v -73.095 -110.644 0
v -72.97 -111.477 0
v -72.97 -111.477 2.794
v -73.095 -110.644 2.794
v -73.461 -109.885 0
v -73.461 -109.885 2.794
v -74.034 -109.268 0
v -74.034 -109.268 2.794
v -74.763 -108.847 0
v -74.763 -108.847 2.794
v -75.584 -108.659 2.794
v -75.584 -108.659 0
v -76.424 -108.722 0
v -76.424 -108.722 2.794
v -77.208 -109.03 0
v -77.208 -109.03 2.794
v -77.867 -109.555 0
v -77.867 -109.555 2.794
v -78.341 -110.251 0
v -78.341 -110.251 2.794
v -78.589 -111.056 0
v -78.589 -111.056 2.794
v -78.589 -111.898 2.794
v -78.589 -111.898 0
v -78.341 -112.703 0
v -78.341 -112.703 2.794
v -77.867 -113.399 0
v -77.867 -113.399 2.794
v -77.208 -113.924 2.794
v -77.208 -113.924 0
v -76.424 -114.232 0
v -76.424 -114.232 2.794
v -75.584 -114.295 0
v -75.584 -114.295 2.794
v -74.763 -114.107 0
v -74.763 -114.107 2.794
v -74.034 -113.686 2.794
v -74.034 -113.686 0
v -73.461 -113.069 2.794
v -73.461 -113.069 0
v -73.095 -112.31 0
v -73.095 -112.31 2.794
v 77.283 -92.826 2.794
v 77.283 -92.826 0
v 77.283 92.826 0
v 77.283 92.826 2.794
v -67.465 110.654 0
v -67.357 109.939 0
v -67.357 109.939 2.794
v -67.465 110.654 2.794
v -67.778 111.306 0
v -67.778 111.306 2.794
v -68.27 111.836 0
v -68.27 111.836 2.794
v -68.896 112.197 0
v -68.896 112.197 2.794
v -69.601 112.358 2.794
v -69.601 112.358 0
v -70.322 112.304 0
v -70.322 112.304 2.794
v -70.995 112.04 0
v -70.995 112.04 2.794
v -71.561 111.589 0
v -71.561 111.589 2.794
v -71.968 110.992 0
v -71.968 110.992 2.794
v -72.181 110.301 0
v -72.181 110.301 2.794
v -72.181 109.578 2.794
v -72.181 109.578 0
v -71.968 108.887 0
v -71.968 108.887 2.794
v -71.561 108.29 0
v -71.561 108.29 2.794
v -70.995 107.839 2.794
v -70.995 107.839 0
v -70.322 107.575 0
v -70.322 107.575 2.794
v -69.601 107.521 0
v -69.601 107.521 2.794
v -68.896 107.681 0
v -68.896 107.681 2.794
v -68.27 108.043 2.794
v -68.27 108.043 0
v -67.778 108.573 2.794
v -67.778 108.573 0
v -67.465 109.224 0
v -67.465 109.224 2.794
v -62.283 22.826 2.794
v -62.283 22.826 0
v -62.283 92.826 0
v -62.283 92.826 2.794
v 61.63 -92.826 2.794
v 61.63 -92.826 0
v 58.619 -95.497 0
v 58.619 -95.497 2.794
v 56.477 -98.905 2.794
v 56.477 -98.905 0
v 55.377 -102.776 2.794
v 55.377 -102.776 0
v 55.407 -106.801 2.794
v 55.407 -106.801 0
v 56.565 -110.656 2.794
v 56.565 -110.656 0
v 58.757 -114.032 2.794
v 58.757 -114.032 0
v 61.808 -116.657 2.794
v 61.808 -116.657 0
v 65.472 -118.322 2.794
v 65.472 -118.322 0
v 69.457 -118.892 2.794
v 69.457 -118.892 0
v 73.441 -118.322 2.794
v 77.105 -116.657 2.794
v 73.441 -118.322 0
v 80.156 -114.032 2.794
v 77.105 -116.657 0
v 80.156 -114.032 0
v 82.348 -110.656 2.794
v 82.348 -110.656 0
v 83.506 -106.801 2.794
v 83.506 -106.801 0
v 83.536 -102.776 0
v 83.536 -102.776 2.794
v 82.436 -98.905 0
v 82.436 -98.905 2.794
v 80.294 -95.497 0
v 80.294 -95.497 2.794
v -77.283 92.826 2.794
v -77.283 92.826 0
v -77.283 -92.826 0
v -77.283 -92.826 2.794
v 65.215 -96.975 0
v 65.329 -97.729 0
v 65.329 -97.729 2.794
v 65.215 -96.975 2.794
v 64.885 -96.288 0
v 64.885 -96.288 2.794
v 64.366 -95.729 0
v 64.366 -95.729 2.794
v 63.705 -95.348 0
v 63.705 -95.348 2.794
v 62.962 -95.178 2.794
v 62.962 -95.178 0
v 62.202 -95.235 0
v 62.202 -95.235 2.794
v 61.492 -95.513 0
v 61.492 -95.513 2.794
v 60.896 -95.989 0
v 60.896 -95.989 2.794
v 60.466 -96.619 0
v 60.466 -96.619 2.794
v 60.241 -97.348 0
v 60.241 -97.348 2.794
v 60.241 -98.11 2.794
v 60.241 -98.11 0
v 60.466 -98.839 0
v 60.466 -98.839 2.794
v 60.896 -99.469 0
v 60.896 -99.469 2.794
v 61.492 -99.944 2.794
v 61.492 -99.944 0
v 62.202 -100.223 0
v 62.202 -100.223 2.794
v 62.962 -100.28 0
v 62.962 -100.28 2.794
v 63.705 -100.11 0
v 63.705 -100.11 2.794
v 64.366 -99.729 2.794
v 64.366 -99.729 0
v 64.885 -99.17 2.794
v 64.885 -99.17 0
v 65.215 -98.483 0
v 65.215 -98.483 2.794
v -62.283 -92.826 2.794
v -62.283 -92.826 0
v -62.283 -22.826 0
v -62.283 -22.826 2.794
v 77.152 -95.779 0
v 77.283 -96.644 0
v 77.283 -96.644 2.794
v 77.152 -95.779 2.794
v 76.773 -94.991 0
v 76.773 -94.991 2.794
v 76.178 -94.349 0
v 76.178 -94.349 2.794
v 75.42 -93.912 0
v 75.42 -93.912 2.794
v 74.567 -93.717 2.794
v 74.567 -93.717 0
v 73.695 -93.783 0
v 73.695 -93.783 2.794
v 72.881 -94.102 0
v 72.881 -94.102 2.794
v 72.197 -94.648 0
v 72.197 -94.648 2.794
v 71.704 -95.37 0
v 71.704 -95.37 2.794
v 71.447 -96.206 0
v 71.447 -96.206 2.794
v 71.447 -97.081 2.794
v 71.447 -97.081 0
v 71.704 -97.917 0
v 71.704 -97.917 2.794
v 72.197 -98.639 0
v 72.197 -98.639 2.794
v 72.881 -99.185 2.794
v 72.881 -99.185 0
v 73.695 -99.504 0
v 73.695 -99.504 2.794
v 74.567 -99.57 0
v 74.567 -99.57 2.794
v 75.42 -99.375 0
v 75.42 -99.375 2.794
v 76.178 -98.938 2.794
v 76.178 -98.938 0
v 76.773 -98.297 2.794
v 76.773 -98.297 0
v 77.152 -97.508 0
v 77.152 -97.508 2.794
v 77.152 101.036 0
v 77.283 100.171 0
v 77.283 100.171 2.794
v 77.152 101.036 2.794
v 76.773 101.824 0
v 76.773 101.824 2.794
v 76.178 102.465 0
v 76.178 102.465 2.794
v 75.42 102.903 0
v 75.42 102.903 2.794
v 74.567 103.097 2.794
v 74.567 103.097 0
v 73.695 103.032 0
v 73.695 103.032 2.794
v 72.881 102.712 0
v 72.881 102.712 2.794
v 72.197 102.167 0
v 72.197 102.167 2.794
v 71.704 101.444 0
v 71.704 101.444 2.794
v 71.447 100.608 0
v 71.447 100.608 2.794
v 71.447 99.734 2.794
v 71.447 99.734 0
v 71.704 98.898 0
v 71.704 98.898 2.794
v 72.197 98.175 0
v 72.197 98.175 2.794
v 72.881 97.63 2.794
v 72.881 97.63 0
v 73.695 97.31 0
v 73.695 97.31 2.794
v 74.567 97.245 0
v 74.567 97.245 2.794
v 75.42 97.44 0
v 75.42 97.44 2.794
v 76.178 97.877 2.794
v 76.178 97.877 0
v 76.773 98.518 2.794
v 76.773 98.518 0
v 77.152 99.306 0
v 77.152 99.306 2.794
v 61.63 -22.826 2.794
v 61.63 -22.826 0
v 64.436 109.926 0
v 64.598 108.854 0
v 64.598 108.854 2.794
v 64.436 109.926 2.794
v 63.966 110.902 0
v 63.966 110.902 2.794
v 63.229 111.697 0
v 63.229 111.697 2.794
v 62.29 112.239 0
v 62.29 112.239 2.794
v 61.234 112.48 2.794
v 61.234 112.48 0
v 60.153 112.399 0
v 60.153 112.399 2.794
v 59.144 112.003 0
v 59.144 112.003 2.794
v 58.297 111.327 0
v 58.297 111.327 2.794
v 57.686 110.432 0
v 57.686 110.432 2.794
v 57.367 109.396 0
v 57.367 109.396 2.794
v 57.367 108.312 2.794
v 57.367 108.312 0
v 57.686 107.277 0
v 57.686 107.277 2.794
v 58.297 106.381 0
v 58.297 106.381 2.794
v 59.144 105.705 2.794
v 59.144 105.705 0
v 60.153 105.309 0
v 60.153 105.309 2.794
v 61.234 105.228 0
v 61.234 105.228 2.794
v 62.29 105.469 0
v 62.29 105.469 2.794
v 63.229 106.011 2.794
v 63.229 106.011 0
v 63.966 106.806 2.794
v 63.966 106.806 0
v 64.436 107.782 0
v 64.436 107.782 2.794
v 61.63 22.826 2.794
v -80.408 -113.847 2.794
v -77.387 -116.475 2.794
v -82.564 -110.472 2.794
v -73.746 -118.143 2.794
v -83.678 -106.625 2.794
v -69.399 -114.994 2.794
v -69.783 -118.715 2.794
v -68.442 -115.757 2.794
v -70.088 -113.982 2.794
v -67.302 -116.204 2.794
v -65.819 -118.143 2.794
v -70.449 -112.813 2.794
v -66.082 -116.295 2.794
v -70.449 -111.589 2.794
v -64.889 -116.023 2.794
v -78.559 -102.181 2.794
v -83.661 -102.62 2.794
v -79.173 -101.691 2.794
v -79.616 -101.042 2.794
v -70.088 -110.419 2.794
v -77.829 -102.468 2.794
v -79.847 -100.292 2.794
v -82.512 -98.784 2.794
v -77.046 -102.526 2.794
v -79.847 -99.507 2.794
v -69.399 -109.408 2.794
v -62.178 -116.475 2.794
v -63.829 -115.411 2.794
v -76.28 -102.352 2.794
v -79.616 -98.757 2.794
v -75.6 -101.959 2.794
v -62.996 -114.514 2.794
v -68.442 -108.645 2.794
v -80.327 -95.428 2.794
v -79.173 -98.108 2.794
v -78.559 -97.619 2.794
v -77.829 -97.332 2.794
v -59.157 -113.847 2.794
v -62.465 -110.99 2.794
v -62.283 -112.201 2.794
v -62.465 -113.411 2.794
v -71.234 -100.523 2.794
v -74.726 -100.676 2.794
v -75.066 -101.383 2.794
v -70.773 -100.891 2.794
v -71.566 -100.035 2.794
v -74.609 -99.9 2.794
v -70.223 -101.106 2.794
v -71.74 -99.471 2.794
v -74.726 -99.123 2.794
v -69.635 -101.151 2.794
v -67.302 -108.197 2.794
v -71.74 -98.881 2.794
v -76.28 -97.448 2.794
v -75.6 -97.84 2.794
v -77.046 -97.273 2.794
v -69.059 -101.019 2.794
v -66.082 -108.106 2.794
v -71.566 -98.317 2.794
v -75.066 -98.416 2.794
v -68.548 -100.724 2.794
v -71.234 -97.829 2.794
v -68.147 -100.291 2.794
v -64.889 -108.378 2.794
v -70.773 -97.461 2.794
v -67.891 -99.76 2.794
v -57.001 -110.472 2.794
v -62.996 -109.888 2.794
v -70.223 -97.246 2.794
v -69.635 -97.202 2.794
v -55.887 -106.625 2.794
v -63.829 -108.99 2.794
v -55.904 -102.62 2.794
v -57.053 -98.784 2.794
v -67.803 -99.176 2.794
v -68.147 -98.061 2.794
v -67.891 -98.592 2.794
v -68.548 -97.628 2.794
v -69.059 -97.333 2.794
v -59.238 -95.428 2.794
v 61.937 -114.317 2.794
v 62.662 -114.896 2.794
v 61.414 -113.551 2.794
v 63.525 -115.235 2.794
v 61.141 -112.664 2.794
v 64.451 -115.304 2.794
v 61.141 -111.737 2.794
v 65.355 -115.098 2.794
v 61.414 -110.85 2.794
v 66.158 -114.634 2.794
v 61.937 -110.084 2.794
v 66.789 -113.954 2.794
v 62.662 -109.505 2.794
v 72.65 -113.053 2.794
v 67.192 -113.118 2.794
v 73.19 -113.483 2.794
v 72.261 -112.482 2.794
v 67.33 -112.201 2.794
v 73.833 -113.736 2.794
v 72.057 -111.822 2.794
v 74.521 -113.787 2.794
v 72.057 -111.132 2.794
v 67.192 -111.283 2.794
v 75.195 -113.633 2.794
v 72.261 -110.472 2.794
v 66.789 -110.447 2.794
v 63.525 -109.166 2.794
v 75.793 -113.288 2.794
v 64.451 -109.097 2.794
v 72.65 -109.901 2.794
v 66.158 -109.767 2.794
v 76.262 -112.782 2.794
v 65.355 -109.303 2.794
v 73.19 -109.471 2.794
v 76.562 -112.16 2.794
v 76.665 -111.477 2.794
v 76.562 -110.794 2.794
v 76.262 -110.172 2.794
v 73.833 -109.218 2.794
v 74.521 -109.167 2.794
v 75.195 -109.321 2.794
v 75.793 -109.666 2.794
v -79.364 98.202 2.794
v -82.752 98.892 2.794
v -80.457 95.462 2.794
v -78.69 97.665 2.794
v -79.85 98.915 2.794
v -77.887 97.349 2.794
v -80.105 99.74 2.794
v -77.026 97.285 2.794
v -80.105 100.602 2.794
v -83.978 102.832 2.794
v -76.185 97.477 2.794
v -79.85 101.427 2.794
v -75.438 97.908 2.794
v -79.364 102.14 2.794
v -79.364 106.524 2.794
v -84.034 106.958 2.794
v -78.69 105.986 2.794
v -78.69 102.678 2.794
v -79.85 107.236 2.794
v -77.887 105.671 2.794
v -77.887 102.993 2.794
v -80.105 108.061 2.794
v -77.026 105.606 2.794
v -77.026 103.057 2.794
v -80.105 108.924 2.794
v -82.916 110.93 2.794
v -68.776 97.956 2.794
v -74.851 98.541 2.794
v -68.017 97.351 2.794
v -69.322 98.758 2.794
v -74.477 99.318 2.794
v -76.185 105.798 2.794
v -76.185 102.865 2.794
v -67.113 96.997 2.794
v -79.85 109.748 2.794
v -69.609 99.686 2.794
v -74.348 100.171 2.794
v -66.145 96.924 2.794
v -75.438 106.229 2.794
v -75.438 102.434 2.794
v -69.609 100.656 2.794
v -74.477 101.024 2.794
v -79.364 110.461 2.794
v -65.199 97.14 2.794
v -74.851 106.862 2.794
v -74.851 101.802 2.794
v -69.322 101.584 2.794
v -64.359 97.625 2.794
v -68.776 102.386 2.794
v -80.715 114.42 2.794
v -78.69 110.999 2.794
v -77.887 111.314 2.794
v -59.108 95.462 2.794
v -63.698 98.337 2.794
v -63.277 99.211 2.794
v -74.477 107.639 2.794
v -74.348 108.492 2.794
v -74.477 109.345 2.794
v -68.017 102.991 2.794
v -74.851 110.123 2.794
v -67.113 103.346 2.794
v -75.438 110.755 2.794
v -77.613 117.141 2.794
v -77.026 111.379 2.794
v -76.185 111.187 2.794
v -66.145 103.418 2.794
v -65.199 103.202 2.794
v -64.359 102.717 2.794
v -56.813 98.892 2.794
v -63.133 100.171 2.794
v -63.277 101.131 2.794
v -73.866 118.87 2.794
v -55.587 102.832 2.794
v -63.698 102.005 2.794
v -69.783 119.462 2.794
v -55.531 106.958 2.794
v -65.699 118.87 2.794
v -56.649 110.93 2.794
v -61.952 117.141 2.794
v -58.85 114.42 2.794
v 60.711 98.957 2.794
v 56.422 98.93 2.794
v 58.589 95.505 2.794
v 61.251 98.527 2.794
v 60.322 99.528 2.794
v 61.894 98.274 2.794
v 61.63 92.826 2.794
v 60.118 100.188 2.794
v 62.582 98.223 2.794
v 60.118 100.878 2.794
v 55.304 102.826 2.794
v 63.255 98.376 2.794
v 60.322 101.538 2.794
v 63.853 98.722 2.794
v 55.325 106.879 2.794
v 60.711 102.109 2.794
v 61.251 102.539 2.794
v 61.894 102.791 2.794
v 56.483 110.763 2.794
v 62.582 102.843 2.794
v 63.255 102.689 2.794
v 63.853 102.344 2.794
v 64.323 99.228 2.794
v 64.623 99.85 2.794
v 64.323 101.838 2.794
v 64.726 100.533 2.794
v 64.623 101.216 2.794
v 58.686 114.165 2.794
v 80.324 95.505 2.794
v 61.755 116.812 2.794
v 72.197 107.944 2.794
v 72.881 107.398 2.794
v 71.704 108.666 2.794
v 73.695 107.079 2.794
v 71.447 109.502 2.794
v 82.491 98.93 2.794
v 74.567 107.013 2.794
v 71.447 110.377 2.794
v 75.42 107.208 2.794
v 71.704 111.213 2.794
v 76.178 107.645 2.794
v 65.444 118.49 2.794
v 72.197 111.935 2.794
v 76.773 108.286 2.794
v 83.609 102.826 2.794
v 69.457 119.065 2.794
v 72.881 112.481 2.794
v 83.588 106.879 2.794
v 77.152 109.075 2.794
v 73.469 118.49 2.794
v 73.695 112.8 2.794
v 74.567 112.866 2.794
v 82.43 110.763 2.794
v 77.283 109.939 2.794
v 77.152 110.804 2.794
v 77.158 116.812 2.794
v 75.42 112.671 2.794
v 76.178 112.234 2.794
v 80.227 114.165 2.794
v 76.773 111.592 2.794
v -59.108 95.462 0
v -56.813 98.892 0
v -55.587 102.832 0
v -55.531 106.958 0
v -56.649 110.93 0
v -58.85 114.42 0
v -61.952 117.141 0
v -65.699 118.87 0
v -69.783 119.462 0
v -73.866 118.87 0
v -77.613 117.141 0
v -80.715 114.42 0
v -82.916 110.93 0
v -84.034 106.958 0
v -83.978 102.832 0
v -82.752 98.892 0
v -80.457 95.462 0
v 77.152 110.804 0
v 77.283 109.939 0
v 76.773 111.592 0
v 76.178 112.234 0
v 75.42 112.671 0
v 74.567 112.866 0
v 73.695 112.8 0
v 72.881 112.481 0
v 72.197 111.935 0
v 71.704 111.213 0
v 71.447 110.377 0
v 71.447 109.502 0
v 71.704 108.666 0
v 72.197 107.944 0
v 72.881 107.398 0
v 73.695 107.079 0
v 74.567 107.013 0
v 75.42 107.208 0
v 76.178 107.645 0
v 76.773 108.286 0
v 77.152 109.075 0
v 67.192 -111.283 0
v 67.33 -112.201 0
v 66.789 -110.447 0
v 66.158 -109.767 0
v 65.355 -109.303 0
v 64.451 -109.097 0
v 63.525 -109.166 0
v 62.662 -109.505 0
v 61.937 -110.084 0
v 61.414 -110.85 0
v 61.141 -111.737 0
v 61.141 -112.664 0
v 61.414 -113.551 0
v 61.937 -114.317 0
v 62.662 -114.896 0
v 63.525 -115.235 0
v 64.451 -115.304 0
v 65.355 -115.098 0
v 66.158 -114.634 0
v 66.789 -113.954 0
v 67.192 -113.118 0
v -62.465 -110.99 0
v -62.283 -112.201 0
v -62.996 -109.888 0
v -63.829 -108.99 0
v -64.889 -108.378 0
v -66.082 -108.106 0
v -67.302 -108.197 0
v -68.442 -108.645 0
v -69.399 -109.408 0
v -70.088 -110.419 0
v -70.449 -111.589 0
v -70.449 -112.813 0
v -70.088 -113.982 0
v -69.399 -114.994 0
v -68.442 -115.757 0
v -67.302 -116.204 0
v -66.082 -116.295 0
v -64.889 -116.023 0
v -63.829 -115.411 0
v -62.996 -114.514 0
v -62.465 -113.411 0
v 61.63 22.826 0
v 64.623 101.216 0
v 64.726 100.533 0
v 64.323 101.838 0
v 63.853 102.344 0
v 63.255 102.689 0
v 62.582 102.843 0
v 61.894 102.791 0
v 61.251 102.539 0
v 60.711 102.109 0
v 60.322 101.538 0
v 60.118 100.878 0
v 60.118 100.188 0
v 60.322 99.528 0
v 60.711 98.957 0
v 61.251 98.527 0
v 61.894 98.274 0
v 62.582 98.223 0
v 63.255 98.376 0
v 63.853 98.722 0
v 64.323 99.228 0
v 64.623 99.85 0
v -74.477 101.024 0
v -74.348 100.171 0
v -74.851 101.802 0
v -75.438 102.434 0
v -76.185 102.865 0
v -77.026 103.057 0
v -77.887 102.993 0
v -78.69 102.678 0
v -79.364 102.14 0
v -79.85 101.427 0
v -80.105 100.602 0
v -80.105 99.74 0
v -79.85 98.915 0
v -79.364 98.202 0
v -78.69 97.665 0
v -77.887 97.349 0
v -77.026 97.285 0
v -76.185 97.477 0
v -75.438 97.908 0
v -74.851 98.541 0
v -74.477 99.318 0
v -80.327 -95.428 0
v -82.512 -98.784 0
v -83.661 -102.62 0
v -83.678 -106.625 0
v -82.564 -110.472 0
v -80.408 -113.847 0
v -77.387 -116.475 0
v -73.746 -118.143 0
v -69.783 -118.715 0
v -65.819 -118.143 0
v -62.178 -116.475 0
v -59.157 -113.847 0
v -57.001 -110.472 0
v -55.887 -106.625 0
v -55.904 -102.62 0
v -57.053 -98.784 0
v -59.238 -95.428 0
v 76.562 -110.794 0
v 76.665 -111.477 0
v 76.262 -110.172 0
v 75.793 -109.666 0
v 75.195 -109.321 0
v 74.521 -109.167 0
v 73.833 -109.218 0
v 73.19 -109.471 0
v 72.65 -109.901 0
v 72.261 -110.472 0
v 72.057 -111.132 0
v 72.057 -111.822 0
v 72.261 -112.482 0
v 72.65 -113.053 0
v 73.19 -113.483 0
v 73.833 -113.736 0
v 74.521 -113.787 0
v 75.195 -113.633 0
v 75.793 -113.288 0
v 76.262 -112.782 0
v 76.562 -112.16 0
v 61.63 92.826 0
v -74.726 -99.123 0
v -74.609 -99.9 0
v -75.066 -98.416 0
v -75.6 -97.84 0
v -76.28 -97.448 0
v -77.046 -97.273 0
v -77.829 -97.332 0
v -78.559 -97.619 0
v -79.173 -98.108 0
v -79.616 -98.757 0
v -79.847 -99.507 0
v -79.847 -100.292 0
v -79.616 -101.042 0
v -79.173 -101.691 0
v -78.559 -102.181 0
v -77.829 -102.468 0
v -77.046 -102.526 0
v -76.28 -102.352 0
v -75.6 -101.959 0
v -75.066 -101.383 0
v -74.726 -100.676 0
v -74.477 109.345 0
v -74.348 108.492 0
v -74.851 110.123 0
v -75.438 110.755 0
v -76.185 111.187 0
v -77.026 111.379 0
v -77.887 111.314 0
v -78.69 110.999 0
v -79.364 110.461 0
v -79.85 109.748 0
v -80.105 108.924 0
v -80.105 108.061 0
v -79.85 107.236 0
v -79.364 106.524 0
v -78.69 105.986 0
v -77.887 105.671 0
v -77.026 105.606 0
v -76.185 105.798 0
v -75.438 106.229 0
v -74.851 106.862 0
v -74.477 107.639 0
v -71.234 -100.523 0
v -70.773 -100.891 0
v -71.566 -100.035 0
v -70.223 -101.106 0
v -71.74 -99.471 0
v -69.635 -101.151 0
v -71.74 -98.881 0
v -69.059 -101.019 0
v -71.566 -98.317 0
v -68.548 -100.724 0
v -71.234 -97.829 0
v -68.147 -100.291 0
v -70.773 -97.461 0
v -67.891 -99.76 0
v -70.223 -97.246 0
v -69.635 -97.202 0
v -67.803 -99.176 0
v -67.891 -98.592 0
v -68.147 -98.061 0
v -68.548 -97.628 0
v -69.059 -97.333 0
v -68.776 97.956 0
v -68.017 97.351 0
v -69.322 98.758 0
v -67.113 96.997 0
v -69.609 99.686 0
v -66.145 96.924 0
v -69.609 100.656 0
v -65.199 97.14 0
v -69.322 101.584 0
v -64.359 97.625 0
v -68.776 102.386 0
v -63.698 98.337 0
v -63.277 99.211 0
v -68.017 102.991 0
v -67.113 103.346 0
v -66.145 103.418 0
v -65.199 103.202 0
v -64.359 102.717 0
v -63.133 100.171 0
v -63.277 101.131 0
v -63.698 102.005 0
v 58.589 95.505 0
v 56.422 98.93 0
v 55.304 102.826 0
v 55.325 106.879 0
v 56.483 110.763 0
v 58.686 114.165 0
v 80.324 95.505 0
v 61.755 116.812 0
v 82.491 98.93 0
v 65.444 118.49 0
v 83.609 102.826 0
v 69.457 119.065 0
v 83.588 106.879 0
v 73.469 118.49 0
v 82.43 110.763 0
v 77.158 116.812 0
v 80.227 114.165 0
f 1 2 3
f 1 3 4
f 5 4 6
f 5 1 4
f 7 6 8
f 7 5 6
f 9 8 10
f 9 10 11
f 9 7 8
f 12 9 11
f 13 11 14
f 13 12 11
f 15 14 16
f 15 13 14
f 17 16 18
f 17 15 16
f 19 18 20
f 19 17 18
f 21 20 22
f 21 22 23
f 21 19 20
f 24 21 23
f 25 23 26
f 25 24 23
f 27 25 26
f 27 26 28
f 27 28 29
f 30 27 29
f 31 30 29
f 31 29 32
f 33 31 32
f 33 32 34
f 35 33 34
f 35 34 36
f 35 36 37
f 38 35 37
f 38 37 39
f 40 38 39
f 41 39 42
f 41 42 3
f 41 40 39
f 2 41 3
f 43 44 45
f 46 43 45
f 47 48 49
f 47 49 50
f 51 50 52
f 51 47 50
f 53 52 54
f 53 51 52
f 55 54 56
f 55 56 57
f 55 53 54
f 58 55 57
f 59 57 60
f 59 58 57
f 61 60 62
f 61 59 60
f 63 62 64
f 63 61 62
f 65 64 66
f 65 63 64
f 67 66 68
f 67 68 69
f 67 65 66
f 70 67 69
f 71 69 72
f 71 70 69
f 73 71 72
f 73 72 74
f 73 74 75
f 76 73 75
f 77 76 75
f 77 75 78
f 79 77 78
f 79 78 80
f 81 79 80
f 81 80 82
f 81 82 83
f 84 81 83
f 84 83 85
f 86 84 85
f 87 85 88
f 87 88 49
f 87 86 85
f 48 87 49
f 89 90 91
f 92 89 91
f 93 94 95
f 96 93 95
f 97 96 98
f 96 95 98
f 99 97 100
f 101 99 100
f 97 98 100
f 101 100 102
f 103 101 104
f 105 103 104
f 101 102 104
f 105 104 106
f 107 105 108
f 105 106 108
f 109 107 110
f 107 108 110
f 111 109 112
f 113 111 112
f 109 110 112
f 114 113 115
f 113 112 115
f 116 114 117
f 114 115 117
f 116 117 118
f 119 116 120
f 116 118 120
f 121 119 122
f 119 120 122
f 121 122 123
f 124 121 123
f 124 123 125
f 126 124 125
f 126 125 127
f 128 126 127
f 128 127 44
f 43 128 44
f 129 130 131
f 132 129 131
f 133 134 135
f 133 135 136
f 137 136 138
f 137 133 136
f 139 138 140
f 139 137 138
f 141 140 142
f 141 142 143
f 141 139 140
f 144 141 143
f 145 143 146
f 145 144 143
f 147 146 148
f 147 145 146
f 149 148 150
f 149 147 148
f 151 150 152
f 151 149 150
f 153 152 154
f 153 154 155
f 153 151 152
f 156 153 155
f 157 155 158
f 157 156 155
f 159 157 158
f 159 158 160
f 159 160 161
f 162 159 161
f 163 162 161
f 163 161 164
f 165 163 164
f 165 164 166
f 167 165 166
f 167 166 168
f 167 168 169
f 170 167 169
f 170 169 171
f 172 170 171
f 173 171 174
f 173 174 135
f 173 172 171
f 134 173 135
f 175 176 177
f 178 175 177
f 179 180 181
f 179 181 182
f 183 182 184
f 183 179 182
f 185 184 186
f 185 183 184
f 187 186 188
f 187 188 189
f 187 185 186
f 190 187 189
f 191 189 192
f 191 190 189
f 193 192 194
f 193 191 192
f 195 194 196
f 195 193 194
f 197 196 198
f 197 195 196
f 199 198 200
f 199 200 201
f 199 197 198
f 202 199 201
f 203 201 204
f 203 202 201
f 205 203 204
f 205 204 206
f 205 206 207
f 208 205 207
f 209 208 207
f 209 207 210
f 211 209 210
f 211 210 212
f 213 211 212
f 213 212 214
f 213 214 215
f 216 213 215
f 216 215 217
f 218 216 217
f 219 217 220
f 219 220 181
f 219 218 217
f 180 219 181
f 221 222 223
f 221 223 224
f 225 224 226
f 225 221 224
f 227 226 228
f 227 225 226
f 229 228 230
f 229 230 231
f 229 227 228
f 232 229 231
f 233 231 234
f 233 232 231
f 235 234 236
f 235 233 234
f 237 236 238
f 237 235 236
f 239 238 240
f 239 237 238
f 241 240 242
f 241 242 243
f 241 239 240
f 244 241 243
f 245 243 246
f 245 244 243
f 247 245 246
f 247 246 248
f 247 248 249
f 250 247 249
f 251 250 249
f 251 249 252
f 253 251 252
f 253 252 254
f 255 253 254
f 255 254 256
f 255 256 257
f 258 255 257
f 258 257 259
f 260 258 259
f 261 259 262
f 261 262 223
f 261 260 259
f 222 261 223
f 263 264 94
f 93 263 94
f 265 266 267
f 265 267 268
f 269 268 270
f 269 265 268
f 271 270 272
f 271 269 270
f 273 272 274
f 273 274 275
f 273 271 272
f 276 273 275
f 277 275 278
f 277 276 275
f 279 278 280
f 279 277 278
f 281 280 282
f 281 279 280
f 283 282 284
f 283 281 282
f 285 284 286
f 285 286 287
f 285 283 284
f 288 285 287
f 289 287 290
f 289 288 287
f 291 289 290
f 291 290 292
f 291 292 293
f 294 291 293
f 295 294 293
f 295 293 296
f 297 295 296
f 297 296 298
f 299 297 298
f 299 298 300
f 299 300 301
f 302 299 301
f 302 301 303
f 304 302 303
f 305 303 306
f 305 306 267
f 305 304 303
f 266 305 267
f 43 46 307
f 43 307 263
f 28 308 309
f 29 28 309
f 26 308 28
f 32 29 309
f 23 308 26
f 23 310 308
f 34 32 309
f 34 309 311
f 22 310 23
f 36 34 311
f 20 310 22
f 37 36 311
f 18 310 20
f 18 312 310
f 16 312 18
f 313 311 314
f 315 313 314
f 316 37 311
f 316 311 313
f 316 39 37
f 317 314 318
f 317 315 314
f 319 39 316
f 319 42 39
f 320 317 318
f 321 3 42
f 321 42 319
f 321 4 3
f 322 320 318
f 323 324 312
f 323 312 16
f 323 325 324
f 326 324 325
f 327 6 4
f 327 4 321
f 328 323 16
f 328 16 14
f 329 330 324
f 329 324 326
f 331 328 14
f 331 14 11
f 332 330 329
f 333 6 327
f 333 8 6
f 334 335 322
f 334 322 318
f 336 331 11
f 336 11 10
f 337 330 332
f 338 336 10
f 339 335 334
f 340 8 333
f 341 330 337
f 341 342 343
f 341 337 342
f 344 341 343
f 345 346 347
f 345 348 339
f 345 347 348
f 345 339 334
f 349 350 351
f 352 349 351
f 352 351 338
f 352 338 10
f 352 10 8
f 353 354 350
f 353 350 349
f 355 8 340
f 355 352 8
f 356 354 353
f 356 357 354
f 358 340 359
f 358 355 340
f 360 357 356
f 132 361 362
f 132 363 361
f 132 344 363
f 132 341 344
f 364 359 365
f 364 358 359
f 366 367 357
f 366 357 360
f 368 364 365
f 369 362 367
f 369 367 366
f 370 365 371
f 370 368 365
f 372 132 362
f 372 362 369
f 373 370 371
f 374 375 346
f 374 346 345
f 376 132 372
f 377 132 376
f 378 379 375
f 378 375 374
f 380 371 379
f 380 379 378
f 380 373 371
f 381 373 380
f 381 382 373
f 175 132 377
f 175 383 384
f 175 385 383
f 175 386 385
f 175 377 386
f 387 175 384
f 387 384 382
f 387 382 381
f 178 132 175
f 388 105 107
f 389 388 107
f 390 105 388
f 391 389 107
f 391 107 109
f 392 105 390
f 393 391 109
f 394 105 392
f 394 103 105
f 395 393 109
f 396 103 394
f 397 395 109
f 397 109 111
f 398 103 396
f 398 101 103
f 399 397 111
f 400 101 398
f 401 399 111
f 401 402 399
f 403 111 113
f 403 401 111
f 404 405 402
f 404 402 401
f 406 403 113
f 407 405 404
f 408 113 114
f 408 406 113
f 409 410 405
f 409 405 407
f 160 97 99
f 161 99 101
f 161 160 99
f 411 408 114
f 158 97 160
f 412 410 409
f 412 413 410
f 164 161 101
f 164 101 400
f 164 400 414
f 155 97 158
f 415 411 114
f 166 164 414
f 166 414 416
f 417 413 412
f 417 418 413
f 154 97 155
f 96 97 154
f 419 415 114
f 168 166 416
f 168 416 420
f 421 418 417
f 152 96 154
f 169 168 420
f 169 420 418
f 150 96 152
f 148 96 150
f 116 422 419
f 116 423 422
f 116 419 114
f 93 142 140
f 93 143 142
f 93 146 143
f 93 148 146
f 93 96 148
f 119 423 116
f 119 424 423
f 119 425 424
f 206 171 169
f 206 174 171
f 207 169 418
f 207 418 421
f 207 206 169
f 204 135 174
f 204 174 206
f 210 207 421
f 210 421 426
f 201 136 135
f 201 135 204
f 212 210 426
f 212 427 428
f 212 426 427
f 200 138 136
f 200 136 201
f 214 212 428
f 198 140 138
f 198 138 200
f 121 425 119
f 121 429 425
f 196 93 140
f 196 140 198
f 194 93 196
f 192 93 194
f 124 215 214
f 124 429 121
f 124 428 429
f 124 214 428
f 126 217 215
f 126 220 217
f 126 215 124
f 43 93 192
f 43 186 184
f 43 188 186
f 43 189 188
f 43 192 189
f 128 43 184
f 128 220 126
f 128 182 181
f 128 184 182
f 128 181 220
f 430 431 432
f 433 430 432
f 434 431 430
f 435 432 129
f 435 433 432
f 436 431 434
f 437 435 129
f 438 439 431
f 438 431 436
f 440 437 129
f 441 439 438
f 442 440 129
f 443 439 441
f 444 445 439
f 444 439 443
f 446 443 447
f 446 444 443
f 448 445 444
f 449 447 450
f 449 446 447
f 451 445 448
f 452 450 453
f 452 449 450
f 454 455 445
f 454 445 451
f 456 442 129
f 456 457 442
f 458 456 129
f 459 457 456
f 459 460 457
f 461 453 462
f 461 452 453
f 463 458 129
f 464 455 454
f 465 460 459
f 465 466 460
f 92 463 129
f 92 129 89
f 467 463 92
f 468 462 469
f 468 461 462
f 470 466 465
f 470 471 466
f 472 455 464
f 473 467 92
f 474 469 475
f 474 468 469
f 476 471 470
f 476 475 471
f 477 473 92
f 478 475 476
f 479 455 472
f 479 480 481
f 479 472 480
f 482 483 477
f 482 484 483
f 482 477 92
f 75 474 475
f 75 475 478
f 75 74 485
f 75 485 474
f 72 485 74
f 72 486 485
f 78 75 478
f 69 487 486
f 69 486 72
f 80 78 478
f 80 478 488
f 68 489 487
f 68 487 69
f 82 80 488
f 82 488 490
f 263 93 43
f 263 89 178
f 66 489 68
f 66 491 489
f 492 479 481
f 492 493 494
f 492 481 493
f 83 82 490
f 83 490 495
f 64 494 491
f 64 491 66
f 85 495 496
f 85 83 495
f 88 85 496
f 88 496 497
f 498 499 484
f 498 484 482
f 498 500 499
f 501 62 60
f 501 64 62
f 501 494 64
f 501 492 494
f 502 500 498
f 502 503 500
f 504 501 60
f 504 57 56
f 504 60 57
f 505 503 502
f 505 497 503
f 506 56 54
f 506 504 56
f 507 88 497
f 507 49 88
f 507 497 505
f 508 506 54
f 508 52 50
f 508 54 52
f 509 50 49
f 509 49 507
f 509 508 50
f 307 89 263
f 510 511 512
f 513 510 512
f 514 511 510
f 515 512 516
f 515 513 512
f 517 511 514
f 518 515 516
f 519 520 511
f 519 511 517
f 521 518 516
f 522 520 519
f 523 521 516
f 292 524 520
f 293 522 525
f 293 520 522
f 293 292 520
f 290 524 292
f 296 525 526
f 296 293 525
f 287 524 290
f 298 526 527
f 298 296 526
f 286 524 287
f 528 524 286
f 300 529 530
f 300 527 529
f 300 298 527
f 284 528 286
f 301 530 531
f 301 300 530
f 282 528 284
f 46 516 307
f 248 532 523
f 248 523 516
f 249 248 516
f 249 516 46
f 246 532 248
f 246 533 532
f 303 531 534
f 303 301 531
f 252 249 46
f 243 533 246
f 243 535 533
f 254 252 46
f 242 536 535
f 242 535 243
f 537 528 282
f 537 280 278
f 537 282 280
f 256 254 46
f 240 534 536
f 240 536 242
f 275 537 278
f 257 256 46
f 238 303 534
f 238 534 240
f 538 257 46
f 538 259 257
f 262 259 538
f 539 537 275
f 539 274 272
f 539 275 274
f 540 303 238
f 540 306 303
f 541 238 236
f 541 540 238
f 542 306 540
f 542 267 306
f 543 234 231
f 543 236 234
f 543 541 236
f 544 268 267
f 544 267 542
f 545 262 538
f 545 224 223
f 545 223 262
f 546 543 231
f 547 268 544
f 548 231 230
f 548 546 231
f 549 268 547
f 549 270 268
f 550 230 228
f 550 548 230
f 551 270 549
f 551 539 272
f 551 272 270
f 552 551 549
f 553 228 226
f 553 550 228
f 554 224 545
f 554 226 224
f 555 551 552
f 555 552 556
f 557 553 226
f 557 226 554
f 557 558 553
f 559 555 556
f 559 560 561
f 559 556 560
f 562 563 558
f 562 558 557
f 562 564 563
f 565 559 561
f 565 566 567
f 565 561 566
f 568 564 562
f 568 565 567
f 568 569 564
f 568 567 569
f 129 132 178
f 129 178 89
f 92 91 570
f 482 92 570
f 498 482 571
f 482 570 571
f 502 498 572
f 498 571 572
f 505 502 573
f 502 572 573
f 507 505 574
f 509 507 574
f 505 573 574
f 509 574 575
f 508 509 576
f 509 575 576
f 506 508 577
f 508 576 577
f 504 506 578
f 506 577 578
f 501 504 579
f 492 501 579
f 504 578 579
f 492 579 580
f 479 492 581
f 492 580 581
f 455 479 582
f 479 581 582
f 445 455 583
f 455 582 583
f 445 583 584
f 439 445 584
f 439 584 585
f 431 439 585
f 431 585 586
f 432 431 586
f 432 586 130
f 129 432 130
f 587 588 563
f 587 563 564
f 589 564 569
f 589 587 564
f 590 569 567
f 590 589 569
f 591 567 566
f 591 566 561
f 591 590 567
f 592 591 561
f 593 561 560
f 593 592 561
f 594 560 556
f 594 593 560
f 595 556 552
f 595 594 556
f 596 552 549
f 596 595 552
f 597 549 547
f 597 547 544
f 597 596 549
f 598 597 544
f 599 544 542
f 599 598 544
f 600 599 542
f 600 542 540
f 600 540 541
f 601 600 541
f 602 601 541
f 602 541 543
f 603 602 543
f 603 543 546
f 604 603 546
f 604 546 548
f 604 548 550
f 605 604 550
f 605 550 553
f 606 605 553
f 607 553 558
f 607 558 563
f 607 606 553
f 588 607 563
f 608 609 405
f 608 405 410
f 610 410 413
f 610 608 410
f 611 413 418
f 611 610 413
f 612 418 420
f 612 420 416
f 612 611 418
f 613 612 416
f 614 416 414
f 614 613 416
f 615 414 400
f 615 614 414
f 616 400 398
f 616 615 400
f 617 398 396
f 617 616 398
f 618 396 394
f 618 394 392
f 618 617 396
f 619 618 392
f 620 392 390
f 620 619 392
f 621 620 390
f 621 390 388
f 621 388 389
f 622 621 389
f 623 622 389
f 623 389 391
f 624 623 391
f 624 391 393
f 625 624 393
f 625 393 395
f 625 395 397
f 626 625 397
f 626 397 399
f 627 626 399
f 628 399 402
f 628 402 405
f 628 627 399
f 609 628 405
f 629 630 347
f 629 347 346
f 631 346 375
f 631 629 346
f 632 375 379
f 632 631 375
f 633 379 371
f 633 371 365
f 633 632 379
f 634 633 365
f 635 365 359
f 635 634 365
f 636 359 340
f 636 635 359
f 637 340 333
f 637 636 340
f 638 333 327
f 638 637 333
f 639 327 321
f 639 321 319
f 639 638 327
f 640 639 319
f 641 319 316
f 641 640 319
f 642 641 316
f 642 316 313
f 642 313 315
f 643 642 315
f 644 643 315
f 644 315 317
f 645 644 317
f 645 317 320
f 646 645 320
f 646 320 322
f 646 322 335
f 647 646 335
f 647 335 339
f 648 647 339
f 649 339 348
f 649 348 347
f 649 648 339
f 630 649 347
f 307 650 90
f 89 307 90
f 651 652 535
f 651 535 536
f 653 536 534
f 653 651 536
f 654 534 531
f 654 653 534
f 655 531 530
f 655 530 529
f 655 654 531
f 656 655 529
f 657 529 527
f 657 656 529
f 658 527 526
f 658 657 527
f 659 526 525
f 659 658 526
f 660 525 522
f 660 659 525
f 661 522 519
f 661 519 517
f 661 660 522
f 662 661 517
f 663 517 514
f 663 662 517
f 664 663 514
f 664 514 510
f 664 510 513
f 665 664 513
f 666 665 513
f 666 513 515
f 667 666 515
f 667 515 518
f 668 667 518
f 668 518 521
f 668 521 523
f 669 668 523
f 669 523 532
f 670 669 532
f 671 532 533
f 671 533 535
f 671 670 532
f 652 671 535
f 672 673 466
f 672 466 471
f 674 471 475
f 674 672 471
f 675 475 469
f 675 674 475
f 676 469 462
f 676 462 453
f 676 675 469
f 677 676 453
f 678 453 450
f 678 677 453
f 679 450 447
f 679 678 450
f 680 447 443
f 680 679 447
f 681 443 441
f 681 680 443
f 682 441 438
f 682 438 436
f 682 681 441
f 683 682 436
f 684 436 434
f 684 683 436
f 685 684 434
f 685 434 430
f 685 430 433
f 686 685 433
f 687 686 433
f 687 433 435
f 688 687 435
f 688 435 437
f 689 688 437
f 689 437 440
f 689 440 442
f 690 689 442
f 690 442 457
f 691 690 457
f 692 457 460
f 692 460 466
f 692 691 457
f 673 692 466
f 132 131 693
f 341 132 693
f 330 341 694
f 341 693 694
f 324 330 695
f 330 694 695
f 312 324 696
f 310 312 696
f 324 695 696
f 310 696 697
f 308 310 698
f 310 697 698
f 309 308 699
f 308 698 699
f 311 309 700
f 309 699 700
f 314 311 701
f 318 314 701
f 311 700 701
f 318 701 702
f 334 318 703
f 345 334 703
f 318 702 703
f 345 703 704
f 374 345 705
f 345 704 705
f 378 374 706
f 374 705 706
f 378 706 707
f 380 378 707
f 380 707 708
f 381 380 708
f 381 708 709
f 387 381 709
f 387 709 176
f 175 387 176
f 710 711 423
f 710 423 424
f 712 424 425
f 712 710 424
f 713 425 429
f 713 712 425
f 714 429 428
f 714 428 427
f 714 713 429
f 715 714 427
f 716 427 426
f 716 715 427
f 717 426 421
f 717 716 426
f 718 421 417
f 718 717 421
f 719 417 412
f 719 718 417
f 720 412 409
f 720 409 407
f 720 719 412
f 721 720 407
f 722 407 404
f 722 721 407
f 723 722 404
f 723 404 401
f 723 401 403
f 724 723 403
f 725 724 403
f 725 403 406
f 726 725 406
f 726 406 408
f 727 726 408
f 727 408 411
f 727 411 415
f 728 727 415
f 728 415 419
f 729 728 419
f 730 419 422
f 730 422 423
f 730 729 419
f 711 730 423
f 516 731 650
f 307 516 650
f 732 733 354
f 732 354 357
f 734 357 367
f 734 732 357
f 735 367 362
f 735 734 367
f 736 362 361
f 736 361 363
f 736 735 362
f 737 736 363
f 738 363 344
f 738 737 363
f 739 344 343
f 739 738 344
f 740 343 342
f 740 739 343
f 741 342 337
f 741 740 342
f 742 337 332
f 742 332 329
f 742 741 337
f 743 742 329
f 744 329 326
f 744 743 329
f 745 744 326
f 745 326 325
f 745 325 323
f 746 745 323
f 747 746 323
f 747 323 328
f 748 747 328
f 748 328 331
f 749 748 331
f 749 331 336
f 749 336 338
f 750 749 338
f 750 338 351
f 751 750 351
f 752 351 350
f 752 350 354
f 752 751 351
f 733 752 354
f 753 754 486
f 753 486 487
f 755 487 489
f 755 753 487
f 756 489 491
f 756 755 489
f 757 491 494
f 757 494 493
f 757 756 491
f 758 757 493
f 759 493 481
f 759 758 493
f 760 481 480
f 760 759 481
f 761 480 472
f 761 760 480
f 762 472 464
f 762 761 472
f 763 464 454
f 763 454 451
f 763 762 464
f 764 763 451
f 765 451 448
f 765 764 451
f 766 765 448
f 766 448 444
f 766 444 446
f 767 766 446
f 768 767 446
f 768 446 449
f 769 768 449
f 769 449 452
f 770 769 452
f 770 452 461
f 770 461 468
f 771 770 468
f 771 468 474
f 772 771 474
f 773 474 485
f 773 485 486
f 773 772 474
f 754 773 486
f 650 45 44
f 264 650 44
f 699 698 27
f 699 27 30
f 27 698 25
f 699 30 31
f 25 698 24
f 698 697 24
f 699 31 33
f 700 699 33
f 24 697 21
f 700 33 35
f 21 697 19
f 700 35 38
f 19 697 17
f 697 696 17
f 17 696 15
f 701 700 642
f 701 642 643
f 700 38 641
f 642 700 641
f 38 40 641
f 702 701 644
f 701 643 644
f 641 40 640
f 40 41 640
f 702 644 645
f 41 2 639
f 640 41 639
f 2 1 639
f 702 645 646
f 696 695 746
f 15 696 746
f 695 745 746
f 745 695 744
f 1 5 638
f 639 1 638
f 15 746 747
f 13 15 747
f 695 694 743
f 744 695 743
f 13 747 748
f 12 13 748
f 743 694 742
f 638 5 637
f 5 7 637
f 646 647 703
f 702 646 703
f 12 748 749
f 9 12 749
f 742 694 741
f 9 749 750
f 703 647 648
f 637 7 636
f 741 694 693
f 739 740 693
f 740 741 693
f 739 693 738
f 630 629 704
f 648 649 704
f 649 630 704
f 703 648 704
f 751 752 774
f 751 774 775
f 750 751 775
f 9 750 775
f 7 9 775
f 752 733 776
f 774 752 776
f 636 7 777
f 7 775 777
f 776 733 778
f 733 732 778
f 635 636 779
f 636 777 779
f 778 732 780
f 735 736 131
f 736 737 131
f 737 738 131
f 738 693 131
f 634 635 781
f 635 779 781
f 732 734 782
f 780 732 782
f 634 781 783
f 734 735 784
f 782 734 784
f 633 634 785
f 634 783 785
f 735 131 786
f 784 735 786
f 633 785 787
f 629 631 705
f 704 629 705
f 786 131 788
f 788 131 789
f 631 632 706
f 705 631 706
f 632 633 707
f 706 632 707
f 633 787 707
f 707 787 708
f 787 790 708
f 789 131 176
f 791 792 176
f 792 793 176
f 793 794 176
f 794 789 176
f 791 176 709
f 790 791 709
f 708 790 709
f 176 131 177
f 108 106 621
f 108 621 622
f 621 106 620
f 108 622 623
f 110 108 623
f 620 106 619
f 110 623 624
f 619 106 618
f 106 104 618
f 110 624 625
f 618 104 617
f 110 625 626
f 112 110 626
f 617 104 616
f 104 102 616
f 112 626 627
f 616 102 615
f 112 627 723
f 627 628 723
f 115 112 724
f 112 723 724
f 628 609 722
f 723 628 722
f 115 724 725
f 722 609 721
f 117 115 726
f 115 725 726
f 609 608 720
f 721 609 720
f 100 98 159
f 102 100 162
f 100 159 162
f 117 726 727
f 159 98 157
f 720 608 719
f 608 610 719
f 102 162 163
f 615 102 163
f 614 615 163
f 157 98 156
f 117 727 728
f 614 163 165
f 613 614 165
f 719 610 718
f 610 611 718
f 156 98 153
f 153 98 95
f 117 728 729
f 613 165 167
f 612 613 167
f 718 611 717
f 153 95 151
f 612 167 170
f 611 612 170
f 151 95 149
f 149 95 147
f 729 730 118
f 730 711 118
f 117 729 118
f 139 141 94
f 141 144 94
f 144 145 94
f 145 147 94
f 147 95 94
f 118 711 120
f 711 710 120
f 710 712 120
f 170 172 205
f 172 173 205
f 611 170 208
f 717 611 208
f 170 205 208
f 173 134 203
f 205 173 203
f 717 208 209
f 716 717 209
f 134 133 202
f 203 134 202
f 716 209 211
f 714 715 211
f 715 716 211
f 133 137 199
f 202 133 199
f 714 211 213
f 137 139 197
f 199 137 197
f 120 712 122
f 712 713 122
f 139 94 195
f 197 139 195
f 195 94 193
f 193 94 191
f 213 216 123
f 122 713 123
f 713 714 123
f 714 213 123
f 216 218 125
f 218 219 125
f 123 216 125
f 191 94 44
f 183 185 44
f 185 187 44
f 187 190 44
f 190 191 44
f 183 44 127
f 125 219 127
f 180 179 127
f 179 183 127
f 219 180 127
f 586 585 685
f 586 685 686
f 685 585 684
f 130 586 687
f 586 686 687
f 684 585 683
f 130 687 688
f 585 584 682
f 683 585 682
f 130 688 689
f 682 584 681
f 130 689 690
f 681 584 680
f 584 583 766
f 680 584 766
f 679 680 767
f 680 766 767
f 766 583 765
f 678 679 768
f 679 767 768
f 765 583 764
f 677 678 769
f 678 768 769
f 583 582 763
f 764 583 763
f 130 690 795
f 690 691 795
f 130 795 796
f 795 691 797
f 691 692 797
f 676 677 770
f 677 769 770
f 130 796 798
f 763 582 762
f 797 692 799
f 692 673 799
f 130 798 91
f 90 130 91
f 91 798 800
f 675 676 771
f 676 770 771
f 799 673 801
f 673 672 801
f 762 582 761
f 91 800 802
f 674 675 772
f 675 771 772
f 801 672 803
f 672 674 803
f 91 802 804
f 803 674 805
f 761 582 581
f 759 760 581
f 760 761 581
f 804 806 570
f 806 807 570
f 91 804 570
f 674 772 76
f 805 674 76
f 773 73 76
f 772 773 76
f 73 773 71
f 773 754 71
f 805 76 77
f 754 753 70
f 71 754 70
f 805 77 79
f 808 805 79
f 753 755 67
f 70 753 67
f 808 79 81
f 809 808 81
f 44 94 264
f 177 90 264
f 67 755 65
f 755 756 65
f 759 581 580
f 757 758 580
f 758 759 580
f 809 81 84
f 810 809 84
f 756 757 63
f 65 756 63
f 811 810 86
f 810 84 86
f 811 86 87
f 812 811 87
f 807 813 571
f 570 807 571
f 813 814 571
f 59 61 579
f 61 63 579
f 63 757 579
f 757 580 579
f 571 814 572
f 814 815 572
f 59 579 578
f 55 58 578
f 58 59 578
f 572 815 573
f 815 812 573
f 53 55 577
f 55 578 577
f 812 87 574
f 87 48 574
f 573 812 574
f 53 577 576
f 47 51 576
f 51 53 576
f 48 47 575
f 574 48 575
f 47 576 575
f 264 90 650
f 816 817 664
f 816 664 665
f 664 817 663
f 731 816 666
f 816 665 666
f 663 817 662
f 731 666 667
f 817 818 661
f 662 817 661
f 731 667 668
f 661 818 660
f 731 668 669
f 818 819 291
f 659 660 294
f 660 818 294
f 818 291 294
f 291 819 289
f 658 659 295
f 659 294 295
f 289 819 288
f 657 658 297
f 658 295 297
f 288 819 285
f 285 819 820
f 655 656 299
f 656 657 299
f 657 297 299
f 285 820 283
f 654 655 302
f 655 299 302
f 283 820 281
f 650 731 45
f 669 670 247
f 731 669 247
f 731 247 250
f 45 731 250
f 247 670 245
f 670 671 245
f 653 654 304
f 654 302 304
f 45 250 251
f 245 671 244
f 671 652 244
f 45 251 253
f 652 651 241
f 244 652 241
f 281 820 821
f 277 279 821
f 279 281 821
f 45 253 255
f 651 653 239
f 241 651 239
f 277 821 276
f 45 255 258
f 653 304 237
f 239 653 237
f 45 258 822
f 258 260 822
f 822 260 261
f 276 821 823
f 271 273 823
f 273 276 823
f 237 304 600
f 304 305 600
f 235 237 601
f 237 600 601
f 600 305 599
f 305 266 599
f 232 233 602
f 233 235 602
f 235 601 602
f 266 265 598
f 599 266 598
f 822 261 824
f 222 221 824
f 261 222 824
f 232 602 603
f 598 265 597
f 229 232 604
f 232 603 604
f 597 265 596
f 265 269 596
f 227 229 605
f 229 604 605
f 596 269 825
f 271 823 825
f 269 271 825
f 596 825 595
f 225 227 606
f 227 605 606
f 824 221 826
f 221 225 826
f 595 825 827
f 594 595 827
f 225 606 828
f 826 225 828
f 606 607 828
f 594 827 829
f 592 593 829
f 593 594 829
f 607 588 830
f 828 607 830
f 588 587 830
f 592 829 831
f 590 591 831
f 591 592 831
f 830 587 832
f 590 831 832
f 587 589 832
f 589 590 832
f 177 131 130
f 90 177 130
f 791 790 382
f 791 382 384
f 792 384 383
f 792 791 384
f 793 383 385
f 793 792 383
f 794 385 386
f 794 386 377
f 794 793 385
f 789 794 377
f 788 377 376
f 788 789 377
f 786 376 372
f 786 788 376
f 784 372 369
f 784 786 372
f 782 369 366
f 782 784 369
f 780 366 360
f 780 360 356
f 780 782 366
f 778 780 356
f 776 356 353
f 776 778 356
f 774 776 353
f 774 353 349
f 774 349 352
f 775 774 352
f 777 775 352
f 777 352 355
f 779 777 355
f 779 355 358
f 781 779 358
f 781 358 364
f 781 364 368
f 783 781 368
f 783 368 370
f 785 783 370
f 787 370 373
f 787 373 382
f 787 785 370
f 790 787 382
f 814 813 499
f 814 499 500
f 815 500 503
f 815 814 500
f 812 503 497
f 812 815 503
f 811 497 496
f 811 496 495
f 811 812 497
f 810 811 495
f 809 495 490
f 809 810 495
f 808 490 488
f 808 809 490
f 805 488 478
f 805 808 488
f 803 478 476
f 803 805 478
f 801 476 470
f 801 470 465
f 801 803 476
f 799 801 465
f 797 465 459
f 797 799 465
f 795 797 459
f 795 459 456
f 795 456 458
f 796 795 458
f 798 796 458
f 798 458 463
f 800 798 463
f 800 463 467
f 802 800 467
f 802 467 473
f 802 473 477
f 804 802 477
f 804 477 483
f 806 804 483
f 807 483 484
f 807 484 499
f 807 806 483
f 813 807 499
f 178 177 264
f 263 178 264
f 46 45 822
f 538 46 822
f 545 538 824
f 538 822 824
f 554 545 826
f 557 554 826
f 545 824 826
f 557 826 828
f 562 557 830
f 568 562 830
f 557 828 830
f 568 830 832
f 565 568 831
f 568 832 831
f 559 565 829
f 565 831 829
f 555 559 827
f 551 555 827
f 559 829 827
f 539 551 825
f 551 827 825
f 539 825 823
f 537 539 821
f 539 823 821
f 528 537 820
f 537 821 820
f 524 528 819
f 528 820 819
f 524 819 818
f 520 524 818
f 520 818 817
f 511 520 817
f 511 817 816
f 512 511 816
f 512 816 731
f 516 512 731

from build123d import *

# Parameters (mm, degrees)
F0_R     = 2.825681
F0_R_2   = 4.106175
F0_R_3   = 2.633884
F0_R_4   = 1.979989
F0_R_5   = 2.894334
F0_R_6   = 3.256127
F0_R_7   = 2.425647
F0_R_8   = 2.316591
F0_R_9   = 3.635961
F0_R_10  = 2.934407
F0_R_11  = 3.112248
F0_R_12  = 2.316604
F0_R_13  = 2.558261
F1_DEPTH = 2.794


with BuildPart() as f1:
    # F0 (on Top) → F1 (new body)
    with BuildSketch(Plane.XY):
        with BuildLine():
            Line((77.282588, -22.826083), (77.282588, 22.826083))
            Line((77.282588, 22.826083), (61.630418, 22.826083))
            Line((61.630418, 22.826083), (-62.282588, 22.826083))
            Line((-62.282588, 22.826083), (-62.282588, 92.826083))
            ThreePointArc((-62.282588, 92.826083), (-69.782588, 119.46184), (-77.282588, 92.826083))
            Line((-77.282588, 92.826083), (-77.282588, 22.826083))
            Line((-77.282588, 22.826083), (-77.282588, -22.826083))
            Line((-77.282588, -22.826083), (-77.282588, -92.826083))
            ThreePointArc((-77.282588, -92.826083), (-69.782588, -118.714864), (-62.282588, -92.826083))
            Line((-62.282588, -92.826083), (-62.282588, -22.826083))
            Line((-62.282588, -22.826083), (61.630418, -22.826083))
            Line((61.630418, -22.826083), (77.282588, -22.826083))
        make_face()
        with Locations((-75.795345, -111.477017)):
            Circle(F0_R, mode=Mode.SUBTRACT)
        with Locations((-66.388763, -112.200603)):
            Circle(F0_R_2, mode=Mode.SUBTRACT)
        with Locations((-77.242516, -99.899687)):
            Circle(F0_R_3, mode=Mode.SUBTRACT)
        with Locations((-69.782588, -99.176109)):
            Circle(F0_R_4, mode=Mode.SUBTRACT)
        with Locations((-77.242516, 100.171089)):
            Circle(F0_R_5, mode=Mode.SUBTRACT)
        with Locations((-66.388763, 100.171089)):
            Circle(F0_R_6, mode=Mode.SUBTRACT)
        with Locations((-77.242516, 108.492292)):
            Circle(F0_R_5, mode=Mode.SUBTRACT)
        with Locations((-69.782588, 109.939463)):
            Circle(F0_R_7, mode=Mode.SUBTRACT)
        with BuildLine():
            Line((61.630418, 22.826083), (77.282588, 22.826083))
            Line((77.282588, 22.826083), (77.282588, 92.826083))
            ThreePointArc((77.282588, 92.826083), (69.456503, 119.065138), (61.630418, 92.826083))
            Line((61.630418, 92.826083), (61.630418, 22.826083))
        make_face()
        with Locations((62.409062, 100.532882)):
            Circle(F0_R_8, mode=Mode.SUBTRACT)
        with Locations((60.961891, 108.854085)):
            Circle(F0_R_9, mode=Mode.SUBTRACT)
        with Locations((74.348181, 100.171089)):
            Circle(F0_R_10, mode=Mode.SUBTRACT)
        with Locations((74.348181, 109.939463)):
            Circle(F0_R_10, mode=Mode.SUBTRACT)
        with BuildLine():
            Line((77.282588, -92.826083), (77.282588, -22.826083))
            Line((77.282588, -22.826083), (61.630418, -22.826083))
            Line((61.630418, -22.826083), (61.630418, -92.826083))
            ThreePointArc((61.630418, -92.826083), (69.456503, -118.891843), (77.282588, -92.826083))
        make_face()
        with Locations((64.218014, -112.200603)):
            Circle(F0_R_11, mode=Mode.SUBTRACT)
        with Locations((74.348181, -111.477017)):
            Circle(F0_R_12, mode=Mode.SUBTRACT)
        with Locations((62.770844, -97.728938)):
            Circle(F0_R_13, mode=Mode.SUBTRACT)
        with Locations((74.348181, -96.64356)):
            Circle(F0_R_10, mode=Mode.SUBTRACT)
    extrude(amount=F1_DEPTH)


solid = f1.part
